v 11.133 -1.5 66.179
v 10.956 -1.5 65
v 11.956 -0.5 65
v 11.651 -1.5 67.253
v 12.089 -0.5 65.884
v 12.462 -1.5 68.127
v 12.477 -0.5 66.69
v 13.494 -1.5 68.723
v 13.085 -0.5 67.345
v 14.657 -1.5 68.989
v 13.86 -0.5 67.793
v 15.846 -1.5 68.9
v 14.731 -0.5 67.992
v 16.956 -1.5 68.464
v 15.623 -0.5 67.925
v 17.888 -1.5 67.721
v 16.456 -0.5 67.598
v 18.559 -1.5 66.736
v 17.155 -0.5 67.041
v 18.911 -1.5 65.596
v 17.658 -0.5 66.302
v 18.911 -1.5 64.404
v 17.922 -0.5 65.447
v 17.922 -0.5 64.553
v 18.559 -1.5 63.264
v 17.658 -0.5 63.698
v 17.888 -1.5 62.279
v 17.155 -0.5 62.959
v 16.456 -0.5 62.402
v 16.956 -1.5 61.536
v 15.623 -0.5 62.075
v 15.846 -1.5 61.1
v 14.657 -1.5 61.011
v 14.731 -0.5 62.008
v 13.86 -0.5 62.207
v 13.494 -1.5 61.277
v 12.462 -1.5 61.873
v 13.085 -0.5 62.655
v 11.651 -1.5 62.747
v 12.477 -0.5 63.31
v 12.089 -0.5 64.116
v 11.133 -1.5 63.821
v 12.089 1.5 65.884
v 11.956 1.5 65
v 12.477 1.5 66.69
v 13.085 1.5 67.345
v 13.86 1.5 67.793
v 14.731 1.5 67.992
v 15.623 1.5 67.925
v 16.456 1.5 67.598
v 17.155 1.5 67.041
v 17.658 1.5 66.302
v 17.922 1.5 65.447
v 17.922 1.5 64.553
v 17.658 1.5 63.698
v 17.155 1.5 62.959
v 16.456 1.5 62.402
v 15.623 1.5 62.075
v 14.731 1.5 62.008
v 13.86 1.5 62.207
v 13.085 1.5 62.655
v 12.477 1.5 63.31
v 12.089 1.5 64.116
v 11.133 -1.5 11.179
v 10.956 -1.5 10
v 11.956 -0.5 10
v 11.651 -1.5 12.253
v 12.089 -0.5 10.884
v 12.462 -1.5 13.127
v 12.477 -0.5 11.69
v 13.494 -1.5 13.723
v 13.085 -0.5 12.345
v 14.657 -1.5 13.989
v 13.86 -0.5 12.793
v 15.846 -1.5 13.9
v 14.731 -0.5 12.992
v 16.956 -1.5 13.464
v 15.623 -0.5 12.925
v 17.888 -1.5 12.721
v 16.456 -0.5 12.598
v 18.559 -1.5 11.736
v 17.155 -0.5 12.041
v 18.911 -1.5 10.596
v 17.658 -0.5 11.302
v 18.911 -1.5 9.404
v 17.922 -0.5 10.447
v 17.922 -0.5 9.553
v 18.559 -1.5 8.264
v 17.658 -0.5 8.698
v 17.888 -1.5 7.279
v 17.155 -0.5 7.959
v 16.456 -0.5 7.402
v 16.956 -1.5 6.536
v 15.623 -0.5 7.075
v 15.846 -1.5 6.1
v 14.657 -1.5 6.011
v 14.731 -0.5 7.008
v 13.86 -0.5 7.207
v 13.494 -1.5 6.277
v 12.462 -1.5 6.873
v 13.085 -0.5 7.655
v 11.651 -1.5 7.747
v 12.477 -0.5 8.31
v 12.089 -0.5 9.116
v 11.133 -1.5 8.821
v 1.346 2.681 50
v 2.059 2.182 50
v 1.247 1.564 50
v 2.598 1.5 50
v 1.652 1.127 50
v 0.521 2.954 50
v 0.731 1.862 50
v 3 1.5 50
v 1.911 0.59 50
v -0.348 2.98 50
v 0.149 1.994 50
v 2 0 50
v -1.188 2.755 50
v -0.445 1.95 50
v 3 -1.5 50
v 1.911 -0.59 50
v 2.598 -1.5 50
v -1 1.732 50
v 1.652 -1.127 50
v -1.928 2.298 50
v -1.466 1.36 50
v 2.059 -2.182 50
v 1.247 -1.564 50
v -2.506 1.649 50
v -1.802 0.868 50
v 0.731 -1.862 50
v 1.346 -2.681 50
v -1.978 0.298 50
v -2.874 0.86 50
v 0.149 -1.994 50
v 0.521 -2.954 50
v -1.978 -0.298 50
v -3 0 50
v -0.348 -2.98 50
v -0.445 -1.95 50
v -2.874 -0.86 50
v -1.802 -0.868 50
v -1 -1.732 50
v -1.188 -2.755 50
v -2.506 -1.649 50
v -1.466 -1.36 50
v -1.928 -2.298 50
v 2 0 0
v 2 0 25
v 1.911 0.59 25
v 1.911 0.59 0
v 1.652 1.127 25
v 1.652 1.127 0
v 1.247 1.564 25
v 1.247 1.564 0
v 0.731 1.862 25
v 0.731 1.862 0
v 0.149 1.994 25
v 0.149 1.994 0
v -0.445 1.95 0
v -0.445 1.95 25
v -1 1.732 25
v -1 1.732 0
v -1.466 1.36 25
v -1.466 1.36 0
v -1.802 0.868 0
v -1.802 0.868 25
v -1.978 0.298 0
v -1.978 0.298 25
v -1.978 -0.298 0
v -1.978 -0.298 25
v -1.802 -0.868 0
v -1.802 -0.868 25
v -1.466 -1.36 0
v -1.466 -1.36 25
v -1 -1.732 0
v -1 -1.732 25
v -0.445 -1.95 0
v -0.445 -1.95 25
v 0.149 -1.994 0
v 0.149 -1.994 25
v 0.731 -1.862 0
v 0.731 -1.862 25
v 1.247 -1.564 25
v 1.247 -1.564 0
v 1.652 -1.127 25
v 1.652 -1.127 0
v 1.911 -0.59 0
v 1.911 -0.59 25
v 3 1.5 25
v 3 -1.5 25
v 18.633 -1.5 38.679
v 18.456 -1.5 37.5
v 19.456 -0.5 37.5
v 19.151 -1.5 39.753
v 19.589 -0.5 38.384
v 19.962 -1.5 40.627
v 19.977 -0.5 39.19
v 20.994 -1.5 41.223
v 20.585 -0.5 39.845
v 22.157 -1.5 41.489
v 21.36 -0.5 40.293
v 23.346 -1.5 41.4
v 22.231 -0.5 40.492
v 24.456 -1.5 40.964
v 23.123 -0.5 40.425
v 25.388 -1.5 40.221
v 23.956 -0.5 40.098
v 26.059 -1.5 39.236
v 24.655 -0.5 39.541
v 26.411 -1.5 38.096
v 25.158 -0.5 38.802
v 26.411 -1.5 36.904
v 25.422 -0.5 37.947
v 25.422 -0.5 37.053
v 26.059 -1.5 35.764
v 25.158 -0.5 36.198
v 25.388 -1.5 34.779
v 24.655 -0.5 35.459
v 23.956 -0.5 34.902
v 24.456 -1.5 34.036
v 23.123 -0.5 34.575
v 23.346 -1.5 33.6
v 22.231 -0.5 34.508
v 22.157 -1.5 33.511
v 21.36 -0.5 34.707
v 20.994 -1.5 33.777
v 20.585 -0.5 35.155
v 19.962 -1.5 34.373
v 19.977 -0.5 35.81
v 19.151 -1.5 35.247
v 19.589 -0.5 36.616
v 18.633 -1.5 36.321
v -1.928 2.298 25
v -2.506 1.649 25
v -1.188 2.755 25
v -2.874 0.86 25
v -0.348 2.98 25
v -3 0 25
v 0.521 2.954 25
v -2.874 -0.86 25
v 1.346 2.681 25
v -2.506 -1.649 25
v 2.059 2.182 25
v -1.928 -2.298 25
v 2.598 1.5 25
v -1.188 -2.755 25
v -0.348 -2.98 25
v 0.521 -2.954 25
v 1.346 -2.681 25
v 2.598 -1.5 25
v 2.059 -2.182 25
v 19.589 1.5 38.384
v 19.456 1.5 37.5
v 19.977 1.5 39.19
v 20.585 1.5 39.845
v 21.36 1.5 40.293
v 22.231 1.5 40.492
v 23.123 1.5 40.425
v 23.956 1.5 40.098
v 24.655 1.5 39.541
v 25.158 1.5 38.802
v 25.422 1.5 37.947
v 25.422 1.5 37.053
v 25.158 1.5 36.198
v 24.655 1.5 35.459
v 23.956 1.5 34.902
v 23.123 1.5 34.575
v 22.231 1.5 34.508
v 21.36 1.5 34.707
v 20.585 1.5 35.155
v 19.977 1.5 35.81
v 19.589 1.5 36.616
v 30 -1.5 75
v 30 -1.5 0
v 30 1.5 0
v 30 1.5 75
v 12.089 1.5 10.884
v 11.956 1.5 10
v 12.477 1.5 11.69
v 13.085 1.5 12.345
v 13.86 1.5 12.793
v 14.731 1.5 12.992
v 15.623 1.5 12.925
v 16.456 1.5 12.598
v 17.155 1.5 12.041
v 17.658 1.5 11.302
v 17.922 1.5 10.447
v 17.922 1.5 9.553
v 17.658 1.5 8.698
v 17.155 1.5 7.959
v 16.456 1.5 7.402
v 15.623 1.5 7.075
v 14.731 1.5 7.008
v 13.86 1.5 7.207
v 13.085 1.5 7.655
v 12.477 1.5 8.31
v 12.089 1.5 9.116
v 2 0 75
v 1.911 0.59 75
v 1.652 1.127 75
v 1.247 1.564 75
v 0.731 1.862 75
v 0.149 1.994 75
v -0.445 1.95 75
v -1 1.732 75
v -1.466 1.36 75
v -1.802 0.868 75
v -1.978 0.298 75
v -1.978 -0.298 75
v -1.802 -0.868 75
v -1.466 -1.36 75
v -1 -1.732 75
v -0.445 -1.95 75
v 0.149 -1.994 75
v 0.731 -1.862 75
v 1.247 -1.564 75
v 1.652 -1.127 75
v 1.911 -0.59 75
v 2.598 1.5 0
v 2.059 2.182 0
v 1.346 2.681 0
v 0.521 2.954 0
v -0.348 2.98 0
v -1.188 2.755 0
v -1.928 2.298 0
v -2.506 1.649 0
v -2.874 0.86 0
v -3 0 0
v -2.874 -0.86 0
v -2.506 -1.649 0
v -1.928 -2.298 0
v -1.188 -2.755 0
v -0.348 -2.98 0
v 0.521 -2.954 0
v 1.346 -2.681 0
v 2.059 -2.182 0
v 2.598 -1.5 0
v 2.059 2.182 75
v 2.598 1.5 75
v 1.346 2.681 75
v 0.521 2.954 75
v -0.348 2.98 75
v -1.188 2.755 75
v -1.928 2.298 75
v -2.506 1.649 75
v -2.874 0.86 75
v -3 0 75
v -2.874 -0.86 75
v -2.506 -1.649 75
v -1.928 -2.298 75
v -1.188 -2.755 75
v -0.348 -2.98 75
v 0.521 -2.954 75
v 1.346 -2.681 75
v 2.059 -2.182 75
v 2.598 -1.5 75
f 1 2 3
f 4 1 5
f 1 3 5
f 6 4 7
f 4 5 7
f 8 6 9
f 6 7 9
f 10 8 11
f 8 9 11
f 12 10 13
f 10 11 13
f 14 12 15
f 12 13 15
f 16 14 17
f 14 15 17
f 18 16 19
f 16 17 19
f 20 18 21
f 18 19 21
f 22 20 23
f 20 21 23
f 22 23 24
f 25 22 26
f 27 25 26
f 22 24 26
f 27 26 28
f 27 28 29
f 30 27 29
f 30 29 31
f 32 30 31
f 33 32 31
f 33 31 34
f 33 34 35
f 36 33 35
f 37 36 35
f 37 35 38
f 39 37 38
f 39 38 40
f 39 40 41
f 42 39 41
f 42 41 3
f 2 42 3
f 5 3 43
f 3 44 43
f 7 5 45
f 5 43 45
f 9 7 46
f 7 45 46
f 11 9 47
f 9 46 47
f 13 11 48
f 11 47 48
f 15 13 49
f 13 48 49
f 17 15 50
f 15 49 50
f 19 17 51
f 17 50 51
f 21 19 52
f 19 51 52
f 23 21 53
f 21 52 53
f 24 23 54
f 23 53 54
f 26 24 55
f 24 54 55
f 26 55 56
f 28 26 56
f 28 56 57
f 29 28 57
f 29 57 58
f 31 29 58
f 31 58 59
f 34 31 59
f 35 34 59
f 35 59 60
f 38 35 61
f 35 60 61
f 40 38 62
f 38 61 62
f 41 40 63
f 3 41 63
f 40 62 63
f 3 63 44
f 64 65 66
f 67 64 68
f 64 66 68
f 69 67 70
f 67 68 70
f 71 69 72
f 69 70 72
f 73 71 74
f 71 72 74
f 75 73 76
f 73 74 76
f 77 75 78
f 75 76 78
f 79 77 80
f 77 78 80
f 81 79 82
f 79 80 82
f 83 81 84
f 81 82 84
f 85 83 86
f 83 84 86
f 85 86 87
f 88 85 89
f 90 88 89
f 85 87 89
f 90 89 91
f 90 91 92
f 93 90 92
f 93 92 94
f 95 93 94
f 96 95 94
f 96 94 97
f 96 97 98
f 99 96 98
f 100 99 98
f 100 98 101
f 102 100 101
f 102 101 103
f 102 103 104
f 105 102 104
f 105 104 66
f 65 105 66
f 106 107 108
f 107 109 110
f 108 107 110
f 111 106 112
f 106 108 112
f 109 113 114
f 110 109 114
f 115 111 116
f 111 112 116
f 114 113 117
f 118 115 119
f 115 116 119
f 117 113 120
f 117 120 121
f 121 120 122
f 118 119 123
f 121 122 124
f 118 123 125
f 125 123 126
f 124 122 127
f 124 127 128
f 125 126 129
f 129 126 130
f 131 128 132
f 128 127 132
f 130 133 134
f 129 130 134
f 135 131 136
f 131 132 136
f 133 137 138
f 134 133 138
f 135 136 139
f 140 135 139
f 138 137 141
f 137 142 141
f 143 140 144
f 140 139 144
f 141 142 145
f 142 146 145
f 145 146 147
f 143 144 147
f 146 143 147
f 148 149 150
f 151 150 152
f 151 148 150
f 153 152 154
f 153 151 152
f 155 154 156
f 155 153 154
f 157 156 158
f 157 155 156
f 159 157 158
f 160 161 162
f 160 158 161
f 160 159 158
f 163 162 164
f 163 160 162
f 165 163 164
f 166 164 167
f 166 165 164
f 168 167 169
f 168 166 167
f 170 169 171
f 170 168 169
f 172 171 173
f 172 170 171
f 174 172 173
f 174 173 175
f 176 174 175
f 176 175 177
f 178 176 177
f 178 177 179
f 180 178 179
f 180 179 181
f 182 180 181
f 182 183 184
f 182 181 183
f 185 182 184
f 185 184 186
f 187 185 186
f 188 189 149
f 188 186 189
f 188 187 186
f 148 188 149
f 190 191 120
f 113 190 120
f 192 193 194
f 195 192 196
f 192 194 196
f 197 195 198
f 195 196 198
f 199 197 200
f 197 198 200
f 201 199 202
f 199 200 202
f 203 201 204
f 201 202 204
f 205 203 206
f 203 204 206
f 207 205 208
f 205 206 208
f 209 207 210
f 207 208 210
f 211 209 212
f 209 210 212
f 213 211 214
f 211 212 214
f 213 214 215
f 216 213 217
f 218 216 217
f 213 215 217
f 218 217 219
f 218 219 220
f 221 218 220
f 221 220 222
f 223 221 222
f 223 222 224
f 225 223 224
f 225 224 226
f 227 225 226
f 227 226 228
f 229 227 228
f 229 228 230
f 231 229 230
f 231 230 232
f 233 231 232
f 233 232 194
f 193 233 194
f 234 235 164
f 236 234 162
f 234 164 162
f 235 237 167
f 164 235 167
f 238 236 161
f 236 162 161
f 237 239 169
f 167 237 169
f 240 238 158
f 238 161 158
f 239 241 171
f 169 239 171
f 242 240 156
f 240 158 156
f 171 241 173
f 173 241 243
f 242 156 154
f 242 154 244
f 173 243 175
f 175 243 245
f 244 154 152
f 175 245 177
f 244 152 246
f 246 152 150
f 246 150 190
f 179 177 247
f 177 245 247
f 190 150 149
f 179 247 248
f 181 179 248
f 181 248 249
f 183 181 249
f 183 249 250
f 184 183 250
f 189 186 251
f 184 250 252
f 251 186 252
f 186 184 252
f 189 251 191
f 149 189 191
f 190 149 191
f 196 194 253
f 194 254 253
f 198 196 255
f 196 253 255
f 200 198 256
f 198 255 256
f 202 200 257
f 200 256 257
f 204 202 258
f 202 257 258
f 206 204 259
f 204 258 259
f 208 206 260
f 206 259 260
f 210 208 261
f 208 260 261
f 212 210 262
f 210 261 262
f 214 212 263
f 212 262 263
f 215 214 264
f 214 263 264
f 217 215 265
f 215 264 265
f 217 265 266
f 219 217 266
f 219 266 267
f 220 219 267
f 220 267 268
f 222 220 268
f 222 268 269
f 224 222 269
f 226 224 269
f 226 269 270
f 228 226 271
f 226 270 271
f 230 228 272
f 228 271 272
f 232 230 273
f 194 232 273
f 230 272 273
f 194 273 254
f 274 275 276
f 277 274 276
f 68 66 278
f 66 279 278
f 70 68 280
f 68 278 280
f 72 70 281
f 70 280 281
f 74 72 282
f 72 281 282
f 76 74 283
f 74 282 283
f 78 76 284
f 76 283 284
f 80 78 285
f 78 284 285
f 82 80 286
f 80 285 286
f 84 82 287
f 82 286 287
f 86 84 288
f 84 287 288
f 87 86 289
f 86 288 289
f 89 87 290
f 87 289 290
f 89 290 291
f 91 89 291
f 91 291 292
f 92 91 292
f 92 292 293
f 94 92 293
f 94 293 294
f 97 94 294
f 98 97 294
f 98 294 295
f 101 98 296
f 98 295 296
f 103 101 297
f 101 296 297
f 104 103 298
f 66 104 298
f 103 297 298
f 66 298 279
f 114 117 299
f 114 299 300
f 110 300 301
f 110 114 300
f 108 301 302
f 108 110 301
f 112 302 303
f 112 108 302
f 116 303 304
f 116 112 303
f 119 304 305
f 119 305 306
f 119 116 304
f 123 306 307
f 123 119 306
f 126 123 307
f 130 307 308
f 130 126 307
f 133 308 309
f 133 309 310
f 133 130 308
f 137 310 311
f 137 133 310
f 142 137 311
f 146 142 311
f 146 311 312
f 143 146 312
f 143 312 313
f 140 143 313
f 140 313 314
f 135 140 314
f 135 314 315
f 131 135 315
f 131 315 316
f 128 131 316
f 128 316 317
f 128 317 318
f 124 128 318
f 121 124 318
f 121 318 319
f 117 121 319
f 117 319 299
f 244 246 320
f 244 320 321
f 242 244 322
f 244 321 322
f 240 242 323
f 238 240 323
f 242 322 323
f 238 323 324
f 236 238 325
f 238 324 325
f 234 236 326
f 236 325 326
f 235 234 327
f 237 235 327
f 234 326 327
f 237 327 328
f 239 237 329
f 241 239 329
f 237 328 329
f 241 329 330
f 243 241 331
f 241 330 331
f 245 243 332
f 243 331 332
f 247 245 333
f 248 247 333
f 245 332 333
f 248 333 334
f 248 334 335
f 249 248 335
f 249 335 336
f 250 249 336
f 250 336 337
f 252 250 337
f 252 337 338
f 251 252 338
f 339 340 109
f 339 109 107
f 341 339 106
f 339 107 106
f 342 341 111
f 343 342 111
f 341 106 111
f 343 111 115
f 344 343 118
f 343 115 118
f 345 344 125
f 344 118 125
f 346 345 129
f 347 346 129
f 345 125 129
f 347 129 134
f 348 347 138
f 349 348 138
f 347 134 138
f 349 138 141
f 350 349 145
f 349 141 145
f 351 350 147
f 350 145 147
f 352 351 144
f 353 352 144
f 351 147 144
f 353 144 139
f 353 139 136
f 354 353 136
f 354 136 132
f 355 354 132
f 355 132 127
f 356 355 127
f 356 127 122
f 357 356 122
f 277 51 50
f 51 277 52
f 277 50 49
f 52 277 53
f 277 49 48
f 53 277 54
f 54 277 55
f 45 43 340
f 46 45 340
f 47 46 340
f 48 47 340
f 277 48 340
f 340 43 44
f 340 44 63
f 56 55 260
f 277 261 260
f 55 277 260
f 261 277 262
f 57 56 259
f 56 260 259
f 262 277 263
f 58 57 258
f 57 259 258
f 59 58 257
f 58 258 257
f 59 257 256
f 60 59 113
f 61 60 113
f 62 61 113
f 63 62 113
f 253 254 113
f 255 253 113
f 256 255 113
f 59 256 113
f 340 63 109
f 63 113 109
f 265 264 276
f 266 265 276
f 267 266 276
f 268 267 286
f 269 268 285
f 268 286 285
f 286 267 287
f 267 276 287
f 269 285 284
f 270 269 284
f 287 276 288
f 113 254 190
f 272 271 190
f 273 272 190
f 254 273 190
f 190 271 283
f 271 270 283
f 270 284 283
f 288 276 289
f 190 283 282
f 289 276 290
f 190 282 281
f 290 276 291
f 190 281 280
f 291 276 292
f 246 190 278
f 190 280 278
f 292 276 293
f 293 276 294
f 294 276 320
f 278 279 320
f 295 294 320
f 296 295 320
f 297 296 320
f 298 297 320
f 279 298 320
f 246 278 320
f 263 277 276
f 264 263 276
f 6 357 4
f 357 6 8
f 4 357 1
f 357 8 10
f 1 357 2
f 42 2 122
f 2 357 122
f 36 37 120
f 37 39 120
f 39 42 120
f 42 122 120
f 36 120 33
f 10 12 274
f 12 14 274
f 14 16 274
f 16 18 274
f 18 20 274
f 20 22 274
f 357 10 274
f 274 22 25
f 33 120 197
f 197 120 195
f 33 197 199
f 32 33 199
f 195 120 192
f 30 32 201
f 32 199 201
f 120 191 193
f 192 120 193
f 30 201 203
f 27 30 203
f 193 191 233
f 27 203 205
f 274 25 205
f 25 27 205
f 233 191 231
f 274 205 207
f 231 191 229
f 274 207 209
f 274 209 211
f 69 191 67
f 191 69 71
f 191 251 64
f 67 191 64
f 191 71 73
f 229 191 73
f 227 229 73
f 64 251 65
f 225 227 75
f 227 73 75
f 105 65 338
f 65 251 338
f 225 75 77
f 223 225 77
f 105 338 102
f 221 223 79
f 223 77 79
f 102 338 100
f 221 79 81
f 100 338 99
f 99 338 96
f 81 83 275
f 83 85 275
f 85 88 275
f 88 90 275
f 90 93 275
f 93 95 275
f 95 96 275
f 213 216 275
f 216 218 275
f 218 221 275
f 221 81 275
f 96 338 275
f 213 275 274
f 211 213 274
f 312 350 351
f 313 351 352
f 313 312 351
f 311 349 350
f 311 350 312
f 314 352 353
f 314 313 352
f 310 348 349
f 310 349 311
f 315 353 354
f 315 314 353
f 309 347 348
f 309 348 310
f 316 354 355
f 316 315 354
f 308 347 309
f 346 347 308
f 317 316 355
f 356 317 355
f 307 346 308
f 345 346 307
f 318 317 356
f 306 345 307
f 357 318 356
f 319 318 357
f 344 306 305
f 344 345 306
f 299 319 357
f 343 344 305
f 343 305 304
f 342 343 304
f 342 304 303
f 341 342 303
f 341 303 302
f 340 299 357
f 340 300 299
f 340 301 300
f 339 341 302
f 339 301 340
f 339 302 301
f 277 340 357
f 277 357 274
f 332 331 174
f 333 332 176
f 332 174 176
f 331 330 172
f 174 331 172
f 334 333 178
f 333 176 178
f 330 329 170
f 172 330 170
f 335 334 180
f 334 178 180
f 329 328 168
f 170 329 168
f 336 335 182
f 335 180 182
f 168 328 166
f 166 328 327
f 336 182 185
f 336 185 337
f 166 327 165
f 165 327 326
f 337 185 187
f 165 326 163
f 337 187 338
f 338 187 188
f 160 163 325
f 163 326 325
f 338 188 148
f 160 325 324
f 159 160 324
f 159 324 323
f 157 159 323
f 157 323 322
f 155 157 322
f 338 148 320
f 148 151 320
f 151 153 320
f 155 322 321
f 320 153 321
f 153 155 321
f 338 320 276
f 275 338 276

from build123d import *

# Parameters (mm, degrees)
F0_R           = 2
F1_DEPTH       = 75
F2_W           = 3
F2_H           = 25
F3_DEPTH       = 12.5
F5_D           = 6
F5_CSINK_D     = 8
F5_CSINK_ANGLE = 90


with BuildPart() as f1:
    # F0 (on Top) → F1 (new body)
    with BuildSketch(Plane.XY):
        with BuildLine():
            Line((30, -1.5), (30, 1.5))
            Line((30, 1.5), (2.5980762114, 1.5))
            ThreePointArc((2.5980762114, 1.5), (-3, 0), (2.5980762114, -1.5))
            Line((2.5980762114, -1.5), (30, -1.5))
        make_face()
        Circle(F0_R, mode=Mode.SUBTRACT)
    extrude(amount=F1_DEPTH)

    # F2 (on Front) → F3 (cut, symmetric)
    with BuildSketch(Plane.XZ):
        with Locations((-1.5, 37.5)):
            Rectangle(F2_W, F2_H)
        with Locations((1.5, 37.5)):
            Rectangle(F2_W, F2_H)
    extrude(amount=F3_DEPTH, both=True, mode=Mode.SUBTRACT)

    # F5 (through all)
    with Locations(Plane.XZ.offset(1.5)):
        with Locations((14.9555867538, 65), (22.4555867538, 37.5), (14.9555867538, 10)):
            CounterSinkHole(F5_D / 2, F5_CSINK_D / 2, counter_sink_angle=F5_CSINK_ANGLE)


solid = f1.part
